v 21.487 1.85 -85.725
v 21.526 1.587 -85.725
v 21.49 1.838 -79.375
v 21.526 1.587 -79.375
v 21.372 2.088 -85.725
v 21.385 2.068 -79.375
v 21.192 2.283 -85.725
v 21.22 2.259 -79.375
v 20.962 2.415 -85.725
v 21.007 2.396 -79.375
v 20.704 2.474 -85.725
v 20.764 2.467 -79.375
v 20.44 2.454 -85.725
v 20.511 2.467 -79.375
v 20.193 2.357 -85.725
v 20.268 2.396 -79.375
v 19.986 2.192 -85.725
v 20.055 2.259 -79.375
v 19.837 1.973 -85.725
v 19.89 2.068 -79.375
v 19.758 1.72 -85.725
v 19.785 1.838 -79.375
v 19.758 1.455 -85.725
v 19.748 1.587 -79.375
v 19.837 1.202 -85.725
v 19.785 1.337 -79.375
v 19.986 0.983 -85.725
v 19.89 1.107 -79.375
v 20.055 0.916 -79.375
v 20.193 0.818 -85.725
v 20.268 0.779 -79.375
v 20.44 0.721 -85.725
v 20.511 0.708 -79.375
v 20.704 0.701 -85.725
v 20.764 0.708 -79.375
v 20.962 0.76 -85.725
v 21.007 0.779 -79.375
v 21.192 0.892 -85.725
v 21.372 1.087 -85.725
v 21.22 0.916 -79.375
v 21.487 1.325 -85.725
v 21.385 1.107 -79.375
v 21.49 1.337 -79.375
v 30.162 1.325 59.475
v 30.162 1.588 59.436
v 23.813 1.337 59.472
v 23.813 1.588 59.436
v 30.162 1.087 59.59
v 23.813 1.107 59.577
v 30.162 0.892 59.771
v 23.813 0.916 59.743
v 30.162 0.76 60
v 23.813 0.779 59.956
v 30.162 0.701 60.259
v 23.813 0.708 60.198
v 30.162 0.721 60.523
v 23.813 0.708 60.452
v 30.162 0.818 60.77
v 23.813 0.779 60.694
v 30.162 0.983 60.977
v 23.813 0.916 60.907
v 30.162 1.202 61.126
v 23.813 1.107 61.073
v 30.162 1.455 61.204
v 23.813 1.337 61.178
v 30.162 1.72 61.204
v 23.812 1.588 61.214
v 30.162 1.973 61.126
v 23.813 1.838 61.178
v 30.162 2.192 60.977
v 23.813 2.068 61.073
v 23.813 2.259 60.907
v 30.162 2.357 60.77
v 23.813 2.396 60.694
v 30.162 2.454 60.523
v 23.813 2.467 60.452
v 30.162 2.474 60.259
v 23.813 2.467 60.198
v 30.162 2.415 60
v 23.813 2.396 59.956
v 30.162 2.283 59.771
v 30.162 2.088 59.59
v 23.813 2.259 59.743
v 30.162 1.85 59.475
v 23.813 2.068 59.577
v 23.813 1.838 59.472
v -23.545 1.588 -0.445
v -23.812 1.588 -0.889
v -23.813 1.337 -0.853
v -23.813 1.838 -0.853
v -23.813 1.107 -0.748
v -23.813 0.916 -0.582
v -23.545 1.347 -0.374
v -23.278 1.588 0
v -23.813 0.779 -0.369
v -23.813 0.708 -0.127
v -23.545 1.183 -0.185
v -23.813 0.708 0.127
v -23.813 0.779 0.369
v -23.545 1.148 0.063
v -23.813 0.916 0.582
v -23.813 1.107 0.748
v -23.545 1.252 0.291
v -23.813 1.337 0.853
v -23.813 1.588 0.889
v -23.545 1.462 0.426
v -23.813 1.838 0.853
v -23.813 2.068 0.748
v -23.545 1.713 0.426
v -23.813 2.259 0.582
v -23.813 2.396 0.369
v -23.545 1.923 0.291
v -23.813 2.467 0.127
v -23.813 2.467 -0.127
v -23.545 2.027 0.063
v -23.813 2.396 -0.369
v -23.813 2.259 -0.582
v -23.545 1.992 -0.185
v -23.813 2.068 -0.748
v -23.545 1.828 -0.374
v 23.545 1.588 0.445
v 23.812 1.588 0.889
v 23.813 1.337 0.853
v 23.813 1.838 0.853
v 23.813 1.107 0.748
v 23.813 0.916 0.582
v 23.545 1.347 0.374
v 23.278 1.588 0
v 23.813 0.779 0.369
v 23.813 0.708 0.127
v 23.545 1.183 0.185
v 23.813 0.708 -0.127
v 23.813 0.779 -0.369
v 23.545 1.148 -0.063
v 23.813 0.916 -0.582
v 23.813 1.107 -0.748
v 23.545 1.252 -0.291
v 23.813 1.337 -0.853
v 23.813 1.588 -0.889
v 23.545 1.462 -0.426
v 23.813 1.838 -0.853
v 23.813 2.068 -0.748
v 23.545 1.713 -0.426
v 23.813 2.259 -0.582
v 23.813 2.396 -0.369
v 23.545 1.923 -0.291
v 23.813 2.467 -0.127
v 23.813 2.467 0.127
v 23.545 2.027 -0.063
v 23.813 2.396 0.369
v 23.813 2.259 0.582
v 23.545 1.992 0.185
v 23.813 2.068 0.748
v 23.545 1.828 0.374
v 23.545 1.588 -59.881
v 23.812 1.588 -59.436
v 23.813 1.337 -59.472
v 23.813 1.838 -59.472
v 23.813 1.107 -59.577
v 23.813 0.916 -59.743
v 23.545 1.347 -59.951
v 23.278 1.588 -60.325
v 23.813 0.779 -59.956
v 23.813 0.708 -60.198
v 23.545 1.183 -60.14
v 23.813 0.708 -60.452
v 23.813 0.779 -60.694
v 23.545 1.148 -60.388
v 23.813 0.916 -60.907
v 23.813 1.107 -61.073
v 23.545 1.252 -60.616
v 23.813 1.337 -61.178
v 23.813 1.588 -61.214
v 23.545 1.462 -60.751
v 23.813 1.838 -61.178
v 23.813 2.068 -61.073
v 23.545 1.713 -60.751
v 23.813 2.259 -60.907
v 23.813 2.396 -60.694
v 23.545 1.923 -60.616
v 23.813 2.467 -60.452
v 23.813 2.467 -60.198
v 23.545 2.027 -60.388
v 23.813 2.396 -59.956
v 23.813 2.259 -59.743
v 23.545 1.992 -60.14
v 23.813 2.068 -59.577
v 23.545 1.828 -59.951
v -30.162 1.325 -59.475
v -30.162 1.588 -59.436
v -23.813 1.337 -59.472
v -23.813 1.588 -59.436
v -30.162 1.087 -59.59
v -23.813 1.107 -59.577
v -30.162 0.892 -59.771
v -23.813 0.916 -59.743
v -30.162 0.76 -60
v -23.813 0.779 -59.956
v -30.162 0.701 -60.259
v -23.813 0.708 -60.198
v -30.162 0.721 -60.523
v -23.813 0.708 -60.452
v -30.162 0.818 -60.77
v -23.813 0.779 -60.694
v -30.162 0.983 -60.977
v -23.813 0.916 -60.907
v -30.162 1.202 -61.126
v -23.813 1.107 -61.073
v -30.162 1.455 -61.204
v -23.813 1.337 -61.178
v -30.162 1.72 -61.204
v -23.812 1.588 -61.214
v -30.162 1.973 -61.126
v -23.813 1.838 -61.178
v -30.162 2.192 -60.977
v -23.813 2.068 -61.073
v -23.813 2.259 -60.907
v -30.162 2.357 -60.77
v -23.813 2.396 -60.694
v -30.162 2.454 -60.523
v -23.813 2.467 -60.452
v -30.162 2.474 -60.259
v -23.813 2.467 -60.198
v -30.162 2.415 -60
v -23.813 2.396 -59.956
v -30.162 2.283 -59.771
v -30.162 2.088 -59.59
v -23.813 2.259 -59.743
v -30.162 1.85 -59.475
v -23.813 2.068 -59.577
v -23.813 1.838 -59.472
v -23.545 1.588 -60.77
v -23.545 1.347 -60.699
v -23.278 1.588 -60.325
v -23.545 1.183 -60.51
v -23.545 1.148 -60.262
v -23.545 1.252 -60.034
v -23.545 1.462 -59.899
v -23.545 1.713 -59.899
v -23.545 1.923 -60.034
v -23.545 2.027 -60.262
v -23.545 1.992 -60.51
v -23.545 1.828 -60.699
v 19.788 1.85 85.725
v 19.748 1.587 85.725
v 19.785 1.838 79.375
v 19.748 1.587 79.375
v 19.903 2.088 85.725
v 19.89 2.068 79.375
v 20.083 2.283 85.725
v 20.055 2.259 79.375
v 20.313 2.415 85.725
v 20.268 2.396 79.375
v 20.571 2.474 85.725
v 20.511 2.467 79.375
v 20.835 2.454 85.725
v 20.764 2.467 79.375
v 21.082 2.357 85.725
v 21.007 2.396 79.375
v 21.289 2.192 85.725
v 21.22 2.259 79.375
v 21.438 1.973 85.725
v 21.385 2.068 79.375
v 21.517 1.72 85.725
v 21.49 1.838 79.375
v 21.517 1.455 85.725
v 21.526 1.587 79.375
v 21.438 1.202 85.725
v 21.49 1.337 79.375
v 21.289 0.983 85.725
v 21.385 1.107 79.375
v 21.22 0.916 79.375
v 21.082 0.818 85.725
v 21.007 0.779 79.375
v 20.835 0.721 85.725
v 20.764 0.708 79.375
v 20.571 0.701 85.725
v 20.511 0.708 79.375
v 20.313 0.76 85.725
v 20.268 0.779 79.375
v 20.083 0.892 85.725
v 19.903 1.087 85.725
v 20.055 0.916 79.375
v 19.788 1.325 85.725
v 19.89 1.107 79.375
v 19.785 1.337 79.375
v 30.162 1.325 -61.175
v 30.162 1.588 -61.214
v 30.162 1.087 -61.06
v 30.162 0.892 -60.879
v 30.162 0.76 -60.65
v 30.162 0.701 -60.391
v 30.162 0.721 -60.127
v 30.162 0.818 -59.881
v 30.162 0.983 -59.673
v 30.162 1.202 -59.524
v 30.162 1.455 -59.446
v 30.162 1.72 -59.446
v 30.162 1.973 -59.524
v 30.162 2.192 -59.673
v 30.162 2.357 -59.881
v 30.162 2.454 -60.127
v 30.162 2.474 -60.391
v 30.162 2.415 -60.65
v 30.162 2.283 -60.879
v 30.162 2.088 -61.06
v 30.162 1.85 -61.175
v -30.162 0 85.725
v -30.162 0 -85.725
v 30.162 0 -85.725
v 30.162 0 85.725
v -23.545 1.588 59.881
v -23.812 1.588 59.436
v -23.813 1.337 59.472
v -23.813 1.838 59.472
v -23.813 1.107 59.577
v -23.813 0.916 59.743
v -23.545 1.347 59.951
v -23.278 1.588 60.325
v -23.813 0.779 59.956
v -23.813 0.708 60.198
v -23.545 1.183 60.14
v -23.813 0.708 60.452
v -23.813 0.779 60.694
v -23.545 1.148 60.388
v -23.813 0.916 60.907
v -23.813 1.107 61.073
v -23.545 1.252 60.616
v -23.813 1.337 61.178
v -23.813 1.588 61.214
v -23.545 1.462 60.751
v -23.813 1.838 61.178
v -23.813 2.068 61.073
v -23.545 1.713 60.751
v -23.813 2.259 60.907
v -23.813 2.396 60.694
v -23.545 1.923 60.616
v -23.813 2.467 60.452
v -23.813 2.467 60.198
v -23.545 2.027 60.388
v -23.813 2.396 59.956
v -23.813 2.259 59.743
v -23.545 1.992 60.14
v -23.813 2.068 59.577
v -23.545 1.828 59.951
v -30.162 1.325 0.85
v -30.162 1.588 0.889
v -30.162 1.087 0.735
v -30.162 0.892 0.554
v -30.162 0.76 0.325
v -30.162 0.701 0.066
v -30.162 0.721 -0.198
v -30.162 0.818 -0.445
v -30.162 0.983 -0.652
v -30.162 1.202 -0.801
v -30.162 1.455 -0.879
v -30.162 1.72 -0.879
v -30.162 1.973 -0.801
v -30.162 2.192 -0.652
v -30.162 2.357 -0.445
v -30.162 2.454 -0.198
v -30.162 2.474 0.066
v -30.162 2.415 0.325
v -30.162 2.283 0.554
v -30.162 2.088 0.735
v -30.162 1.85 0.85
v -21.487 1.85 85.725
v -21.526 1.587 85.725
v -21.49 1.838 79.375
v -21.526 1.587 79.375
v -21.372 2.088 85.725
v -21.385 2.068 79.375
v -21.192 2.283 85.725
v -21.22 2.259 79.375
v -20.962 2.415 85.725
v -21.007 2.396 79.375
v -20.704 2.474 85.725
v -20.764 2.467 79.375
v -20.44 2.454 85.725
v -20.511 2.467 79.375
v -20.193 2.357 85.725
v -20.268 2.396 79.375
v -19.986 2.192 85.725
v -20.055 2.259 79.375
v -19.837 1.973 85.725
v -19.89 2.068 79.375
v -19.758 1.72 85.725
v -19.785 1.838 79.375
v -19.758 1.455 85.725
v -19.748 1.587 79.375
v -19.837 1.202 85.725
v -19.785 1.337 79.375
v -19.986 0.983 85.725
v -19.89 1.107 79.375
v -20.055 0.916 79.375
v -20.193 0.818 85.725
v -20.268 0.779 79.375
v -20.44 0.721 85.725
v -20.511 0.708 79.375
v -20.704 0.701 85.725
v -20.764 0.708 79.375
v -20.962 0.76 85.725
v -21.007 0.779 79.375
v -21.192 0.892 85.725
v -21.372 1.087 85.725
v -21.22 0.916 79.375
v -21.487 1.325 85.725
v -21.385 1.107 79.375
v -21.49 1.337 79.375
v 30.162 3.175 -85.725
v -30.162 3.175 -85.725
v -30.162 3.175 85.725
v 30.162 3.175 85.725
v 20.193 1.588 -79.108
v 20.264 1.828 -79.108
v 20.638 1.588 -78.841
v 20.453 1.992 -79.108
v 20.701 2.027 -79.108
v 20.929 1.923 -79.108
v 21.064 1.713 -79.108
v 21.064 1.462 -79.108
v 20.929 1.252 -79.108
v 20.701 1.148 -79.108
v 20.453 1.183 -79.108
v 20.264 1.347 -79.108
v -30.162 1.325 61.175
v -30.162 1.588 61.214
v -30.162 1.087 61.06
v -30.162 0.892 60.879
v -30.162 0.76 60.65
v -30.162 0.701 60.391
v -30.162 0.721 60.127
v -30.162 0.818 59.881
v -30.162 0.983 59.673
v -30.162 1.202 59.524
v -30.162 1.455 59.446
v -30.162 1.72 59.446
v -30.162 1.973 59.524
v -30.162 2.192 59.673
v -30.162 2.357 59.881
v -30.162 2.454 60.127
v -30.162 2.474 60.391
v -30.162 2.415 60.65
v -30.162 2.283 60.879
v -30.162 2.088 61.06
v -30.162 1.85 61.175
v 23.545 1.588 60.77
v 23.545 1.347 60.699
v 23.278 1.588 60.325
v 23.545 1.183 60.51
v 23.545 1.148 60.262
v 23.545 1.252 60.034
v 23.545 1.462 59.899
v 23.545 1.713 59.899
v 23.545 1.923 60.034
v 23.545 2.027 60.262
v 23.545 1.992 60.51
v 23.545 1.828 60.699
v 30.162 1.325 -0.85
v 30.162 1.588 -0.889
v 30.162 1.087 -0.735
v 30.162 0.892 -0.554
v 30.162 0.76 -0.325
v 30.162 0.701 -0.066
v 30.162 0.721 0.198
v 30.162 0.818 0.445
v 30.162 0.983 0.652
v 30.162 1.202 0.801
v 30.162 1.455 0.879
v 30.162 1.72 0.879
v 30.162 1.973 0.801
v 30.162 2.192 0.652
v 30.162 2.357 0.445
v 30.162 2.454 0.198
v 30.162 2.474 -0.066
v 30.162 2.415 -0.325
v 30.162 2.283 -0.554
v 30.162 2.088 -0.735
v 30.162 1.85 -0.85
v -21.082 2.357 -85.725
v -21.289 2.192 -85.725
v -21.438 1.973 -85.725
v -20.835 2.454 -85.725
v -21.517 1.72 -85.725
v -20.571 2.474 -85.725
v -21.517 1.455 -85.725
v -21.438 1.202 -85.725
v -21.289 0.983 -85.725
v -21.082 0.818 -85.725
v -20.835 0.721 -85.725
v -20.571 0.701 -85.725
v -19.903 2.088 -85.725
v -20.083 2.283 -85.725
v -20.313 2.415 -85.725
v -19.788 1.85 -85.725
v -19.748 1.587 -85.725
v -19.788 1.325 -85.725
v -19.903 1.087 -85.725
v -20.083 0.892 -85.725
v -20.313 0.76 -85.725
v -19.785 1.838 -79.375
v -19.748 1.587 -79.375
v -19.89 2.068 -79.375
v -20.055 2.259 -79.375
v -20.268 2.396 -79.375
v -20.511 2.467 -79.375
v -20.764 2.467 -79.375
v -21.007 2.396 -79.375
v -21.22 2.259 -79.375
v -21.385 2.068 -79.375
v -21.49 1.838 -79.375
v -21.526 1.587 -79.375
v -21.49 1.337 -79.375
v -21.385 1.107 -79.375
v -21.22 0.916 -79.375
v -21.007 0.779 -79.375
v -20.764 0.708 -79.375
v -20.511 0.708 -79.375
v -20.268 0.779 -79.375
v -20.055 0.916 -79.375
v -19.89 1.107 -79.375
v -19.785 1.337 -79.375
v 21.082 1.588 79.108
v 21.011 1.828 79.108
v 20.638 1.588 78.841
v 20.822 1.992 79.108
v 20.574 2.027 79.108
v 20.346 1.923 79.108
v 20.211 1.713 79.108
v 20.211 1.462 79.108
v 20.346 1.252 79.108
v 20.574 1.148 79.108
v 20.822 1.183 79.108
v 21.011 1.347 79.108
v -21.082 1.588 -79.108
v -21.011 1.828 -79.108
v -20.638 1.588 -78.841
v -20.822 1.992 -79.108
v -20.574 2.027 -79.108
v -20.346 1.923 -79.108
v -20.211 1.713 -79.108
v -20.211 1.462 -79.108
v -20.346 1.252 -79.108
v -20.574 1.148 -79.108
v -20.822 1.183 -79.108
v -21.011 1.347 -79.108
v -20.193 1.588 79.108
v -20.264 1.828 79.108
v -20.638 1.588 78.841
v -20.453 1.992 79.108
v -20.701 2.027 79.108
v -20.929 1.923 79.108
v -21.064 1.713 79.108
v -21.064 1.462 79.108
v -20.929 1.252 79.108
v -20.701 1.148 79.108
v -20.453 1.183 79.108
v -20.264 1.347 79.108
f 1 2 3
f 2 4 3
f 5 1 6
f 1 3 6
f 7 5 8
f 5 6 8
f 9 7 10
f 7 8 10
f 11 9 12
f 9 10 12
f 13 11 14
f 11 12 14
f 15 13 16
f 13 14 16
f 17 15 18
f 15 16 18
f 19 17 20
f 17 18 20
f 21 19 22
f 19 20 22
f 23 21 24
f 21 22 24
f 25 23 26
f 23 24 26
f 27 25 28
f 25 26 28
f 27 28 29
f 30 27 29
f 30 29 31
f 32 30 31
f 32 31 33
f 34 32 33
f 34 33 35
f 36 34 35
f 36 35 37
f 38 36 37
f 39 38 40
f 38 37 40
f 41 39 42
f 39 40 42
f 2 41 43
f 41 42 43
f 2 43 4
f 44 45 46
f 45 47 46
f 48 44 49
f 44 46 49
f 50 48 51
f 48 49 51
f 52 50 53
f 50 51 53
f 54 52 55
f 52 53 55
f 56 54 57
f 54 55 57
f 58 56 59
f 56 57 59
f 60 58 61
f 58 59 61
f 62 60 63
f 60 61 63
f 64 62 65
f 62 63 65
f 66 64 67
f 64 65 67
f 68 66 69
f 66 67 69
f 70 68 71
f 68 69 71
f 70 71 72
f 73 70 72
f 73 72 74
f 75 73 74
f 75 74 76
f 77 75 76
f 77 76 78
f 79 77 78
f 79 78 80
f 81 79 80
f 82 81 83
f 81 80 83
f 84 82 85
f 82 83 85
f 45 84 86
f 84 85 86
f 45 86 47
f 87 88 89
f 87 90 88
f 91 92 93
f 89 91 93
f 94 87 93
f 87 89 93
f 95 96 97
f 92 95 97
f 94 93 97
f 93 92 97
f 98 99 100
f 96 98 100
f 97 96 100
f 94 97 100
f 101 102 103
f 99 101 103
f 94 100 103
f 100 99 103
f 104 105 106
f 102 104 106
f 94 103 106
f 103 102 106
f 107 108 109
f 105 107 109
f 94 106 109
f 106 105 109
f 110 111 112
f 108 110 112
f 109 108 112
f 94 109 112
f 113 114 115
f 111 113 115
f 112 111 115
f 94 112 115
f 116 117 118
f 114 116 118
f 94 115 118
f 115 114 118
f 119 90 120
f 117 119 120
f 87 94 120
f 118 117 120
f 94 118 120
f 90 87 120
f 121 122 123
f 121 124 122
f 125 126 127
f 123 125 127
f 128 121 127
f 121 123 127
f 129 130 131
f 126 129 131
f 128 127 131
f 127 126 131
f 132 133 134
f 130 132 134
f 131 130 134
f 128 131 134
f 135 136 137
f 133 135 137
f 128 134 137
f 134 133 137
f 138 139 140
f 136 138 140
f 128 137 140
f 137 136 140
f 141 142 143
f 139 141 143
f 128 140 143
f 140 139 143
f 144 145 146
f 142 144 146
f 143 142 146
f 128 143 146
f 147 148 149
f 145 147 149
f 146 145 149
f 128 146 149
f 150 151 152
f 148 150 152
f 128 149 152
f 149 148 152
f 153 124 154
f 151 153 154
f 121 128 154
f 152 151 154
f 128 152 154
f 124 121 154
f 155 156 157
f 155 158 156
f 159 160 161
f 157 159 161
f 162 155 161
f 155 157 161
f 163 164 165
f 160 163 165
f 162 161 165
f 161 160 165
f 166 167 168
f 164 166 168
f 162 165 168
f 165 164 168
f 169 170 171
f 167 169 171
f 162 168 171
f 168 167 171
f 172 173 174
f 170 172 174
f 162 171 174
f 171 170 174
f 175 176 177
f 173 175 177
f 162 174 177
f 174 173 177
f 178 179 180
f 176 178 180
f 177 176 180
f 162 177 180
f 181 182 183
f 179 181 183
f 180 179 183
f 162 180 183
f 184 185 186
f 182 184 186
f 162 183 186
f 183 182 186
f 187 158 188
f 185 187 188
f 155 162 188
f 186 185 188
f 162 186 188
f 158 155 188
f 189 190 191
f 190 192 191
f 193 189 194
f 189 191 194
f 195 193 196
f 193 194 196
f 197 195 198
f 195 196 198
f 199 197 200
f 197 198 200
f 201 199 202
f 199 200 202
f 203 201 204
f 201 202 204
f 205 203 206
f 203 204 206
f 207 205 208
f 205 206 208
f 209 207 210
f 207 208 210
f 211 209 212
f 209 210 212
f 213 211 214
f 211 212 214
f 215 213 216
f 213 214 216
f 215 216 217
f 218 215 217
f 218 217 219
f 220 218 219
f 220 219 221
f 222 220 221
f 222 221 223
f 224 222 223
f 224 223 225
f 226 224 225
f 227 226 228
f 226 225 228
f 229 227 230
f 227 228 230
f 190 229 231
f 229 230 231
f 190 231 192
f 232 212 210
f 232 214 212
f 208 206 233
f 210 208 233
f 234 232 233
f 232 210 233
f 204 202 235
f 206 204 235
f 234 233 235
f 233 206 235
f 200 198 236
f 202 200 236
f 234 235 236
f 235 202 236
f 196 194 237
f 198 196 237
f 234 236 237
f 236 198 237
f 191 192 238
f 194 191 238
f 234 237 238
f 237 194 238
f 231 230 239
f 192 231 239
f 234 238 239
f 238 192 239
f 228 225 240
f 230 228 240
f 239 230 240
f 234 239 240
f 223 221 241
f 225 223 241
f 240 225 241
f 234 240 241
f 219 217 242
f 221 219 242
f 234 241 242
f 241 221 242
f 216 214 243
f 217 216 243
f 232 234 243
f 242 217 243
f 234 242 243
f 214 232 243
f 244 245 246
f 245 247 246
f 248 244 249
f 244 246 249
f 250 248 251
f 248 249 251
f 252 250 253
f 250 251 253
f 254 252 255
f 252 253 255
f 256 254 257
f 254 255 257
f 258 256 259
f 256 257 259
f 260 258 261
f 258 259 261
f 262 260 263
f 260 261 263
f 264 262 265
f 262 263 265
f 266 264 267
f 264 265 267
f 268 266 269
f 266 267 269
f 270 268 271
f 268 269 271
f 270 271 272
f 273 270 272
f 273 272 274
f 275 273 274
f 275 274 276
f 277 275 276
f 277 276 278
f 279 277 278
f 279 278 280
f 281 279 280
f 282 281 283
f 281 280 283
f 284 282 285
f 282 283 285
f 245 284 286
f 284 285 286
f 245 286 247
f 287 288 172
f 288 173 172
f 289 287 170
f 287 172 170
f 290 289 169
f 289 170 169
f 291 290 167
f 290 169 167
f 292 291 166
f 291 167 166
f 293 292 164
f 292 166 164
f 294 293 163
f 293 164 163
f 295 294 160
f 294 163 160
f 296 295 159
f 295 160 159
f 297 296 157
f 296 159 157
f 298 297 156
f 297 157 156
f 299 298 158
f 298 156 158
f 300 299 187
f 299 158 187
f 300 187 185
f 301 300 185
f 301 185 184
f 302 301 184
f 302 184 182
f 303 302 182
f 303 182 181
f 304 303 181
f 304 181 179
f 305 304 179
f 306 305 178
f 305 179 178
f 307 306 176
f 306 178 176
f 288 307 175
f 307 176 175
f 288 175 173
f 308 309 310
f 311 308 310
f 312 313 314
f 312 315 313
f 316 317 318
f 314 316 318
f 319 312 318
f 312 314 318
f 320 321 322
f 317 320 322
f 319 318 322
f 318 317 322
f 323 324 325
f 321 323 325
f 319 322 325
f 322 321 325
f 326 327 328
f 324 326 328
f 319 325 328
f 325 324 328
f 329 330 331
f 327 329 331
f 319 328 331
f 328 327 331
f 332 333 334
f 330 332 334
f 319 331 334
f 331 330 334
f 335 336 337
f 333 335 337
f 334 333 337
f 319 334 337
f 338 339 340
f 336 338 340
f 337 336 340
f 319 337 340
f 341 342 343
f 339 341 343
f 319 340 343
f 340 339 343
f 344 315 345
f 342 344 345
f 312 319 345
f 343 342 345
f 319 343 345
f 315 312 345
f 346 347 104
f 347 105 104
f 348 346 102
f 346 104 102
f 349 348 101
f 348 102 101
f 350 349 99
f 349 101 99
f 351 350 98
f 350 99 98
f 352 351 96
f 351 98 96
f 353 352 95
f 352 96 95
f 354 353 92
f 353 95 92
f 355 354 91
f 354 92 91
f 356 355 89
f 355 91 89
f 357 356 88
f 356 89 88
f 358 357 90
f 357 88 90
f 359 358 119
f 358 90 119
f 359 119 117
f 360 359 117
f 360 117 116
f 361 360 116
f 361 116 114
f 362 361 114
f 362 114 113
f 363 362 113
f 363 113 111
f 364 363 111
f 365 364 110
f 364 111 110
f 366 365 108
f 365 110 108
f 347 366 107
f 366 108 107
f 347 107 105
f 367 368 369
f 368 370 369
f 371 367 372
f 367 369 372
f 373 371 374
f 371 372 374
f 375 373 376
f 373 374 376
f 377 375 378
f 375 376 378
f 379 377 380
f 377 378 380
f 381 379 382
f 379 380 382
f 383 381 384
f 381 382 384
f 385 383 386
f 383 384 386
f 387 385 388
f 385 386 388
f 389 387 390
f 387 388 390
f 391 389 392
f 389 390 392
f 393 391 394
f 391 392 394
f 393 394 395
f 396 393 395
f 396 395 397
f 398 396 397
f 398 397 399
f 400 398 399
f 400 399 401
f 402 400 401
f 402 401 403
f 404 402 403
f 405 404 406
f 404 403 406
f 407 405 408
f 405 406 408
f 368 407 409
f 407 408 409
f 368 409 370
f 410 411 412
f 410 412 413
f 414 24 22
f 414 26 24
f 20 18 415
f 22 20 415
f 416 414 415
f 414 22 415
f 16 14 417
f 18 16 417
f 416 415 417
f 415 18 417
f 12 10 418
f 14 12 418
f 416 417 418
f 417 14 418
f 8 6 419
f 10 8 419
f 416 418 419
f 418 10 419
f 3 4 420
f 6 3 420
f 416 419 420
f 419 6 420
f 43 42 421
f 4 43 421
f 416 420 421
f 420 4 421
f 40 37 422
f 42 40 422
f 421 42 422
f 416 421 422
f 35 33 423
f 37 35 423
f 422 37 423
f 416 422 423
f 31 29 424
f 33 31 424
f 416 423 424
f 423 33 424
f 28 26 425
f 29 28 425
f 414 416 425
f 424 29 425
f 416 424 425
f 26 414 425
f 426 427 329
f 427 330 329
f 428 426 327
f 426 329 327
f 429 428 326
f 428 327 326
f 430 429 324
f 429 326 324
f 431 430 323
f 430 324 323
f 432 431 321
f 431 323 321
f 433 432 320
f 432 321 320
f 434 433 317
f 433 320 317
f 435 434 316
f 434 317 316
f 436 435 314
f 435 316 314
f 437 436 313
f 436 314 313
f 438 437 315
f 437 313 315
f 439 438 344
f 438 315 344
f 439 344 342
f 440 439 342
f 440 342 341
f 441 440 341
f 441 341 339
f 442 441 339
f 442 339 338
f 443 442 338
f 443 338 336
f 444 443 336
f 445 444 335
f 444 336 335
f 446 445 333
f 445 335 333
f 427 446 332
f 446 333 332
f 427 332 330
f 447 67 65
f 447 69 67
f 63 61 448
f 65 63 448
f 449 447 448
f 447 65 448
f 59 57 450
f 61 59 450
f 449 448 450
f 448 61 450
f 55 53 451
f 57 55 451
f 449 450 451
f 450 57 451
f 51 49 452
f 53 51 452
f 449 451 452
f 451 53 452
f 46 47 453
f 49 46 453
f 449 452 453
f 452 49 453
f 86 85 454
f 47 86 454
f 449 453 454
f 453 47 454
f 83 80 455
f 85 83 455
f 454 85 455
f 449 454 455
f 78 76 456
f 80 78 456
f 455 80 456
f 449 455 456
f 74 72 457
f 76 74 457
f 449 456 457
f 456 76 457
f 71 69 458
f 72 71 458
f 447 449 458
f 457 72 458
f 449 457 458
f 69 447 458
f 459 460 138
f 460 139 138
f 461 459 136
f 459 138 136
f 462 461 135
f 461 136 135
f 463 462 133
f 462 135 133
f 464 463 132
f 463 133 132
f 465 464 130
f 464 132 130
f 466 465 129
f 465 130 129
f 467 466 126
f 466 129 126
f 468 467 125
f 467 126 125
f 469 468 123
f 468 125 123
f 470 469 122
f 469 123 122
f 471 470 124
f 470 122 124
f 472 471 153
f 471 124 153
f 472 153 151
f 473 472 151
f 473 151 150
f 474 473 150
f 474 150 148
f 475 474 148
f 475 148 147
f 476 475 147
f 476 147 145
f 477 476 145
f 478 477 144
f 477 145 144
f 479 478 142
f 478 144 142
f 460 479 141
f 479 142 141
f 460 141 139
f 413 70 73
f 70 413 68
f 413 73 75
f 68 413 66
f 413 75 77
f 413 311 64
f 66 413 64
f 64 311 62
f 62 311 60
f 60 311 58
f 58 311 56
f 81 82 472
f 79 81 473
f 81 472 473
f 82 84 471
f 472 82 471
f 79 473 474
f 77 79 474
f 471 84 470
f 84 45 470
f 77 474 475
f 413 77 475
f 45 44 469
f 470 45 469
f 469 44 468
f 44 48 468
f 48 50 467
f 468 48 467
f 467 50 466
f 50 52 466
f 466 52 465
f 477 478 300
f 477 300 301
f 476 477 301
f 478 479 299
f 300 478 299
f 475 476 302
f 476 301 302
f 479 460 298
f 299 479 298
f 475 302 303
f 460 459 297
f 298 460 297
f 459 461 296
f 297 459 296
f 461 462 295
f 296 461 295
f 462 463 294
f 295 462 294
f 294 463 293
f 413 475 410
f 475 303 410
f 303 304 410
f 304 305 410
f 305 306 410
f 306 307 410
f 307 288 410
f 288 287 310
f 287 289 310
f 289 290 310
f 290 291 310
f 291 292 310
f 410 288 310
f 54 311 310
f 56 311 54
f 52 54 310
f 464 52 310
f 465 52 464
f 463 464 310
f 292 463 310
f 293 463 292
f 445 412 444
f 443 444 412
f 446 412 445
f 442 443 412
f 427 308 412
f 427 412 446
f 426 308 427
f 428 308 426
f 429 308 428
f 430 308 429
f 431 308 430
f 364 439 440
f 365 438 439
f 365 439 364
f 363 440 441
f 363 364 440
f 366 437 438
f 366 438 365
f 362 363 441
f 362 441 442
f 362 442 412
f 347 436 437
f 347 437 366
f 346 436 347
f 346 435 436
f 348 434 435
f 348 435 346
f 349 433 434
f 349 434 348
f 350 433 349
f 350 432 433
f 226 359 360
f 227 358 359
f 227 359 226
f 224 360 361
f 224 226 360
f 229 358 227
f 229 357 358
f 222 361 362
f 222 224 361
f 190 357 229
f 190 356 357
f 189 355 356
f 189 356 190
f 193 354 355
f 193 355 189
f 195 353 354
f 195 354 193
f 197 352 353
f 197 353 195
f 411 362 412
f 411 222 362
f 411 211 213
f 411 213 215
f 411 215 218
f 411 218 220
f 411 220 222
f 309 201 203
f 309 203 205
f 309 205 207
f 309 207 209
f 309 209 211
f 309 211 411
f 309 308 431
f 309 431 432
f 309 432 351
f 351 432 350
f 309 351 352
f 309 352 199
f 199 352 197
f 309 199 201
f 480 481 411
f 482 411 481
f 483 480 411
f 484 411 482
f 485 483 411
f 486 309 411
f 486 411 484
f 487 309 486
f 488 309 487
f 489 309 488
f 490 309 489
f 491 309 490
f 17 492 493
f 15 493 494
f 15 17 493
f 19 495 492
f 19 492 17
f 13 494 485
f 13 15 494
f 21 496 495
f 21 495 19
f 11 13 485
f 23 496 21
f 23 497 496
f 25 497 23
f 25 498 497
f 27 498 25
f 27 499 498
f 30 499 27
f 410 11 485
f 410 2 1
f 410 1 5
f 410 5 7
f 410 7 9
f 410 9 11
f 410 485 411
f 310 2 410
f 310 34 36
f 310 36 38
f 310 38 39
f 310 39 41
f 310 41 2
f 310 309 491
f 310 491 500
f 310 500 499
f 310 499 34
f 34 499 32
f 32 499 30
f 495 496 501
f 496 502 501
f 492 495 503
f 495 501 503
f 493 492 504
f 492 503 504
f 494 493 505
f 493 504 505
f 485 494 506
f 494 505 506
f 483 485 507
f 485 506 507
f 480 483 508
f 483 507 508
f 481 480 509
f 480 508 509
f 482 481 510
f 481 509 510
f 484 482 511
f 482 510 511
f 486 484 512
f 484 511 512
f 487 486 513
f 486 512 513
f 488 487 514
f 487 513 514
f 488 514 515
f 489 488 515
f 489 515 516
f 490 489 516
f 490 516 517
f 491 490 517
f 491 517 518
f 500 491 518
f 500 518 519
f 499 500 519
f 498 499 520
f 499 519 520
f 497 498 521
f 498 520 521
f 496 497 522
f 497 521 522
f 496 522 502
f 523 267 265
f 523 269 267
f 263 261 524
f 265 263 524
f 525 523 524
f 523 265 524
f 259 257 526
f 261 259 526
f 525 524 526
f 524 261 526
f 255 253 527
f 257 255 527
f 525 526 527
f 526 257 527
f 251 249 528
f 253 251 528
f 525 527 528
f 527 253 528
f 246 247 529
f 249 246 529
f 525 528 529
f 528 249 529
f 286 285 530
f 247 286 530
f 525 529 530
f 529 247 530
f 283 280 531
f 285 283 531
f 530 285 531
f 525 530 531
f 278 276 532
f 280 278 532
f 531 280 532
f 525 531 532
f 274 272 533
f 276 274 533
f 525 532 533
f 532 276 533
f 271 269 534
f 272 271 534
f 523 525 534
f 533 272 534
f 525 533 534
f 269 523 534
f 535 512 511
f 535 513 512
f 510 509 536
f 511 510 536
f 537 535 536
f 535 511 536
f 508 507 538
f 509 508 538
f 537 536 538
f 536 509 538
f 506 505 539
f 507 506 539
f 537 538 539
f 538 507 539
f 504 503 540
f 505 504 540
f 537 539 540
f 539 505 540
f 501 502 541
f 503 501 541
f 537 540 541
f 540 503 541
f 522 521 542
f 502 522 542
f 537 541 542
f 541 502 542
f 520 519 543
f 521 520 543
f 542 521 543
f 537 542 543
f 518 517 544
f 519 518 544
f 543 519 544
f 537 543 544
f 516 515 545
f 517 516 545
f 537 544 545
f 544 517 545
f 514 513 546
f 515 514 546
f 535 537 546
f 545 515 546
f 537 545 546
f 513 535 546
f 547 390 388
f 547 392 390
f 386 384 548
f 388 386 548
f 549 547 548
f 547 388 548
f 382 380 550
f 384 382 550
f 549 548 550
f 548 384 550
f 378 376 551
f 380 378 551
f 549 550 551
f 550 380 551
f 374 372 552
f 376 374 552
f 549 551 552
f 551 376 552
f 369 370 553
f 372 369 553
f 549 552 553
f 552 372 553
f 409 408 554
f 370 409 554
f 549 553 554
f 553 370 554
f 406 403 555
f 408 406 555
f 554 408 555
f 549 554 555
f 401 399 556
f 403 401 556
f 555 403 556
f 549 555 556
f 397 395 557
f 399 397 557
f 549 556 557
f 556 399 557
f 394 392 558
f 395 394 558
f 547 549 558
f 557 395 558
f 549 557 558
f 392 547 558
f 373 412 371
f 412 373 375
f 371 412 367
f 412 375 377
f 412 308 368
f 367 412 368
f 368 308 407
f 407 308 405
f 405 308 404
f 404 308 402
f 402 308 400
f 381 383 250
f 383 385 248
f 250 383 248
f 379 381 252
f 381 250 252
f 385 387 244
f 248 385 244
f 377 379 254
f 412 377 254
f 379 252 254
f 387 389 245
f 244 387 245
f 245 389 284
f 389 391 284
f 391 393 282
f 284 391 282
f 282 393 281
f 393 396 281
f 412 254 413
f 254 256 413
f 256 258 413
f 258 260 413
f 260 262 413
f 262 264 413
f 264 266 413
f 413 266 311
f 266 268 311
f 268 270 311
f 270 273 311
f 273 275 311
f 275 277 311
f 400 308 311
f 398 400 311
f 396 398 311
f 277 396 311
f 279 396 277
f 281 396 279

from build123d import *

# Parameters (mm, degrees)
SKETCH1_W                            = 60.325
SKETCH1_H                            = 171.45
EXTRUDE1_DEPTH                       = 3.175
TAP_DRILL_FOR_2_TAP2_D               = 1.778
TAP_DRILL_FOR_2_TAP2_DEPTH           = 6.35
TAP_DRILL_FOR_2_TAP2_TIP             = 0.53416509
TAP_DRILL_FOR_2_TAP4_D               = 1.778
TAP_DRILL_FOR_2_TAP4_DEPTH           = 6.35
TAP_DRILL_FOR_2_TAP4_TIP             = 0.53416509
TAP_DRILL_FOR_2_TAP5_D               = 1.778
TAP_DRILL_FOR_2_TAP5_DEPTH           = 6.35
TAP_DRILL_FOR_2_TAP5_TIP             = 0.53416509
TAP_DRILL_FOR_2_TAP5_ON_FACE_2_D     = 1.778
TAP_DRILL_FOR_2_TAP5_ON_FACE_2_DEPTH = 6.35
TAP_DRILL_FOR_2_TAP5_ON_FACE_2_TIP   = 0.53416509


with BuildPart() as part:
    # Sketch1 → Extrude1 (new body)
    with BuildSketch(Plane(origin=(0, 0, 0), x_dir=(1, 0, 0), z_dir=(0, 1, 0))):
        Rectangle(SKETCH1_W, SKETCH1_H)
    extrude(amount=EXTRUDE1_DEPTH)

    # Tap Drill for #2 Tap2
    with Locations(Plane(origin=(-20.6375, 1.5875, 85.725), x_dir=(1, 0, 0), z_dir=(0, 0, 1))):
        with Locations((0, 0), (41.275, 0)):
            Hole(TAP_DRILL_FOR_2_TAP2_D / 2, depth=TAP_DRILL_FOR_2_TAP2_DEPTH)
            with Locations((0, 0, -(TAP_DRILL_FOR_2_TAP2_DEPTH + TAP_DRILL_FOR_2_TAP2_TIP / 2))):  # 118° drill point
                Cone(0, TAP_DRILL_FOR_2_TAP2_D / 2, TAP_DRILL_FOR_2_TAP2_TIP, mode=Mode.SUBTRACT)

    # Tap Drill for #2 Tap4
    with Locations(Plane(origin=(20.6375, 1.5875, -85.725), x_dir=(-1, 0, 0), z_dir=(0, 0, -1))):
        with Locations((0, 0), (41.275, 0)):
            Hole(TAP_DRILL_FOR_2_TAP4_D / 2, depth=TAP_DRILL_FOR_2_TAP4_DEPTH)
            with Locations((0, 0, -(TAP_DRILL_FOR_2_TAP4_DEPTH + TAP_DRILL_FOR_2_TAP4_TIP / 2))):  # 118° drill point
                Cone(0, TAP_DRILL_FOR_2_TAP4_D / 2, TAP_DRILL_FOR_2_TAP4_TIP, mode=Mode.SUBTRACT)

    # Tap Drill for #2 Tap5
    with Locations(Plane(origin=(-30.1625, 1.5875, -60.325), x_dir=(0, 0, -1), z_dir=(-1, 0, 0))):
        with Locations((0, 0), (-120.65, 0), (-60.325, 0)):
            Hole(TAP_DRILL_FOR_2_TAP5_D / 2, depth=TAP_DRILL_FOR_2_TAP5_DEPTH)
            with Locations((0, 0, -(TAP_DRILL_FOR_2_TAP5_DEPTH + TAP_DRILL_FOR_2_TAP5_TIP / 2))):  # 118° drill point
                Cone(0, TAP_DRILL_FOR_2_TAP5_D / 2, TAP_DRILL_FOR_2_TAP5_TIP, mode=Mode.SUBTRACT)

    # Tap Drill for #2 Tap5 on face 2
    with Locations(Plane(origin=(30.1625, 1.5875, -60.325), x_dir=(0, 0, 1), z_dir=(1, 0, 0))):
        with Locations((0, 0), (120.65, 0), (60.325, 0)):
            Hole(TAP_DRILL_FOR_2_TAP5_ON_FACE_2_D / 2, depth=TAP_DRILL_FOR_2_TAP5_ON_FACE_2_DEPTH)
            with Locations((0, 0, -(TAP_DRILL_FOR_2_TAP5_ON_FACE_2_DEPTH + TAP_DRILL_FOR_2_TAP5_ON_FACE_2_TIP / 2))):  # 118° drill point
                Cone(0, TAP_DRILL_FOR_2_TAP5_ON_FACE_2_D / 2, TAP_DRILL_FOR_2_TAP5_ON_FACE_2_TIP, mode=Mode.SUBTRACT)


solid = part.part
